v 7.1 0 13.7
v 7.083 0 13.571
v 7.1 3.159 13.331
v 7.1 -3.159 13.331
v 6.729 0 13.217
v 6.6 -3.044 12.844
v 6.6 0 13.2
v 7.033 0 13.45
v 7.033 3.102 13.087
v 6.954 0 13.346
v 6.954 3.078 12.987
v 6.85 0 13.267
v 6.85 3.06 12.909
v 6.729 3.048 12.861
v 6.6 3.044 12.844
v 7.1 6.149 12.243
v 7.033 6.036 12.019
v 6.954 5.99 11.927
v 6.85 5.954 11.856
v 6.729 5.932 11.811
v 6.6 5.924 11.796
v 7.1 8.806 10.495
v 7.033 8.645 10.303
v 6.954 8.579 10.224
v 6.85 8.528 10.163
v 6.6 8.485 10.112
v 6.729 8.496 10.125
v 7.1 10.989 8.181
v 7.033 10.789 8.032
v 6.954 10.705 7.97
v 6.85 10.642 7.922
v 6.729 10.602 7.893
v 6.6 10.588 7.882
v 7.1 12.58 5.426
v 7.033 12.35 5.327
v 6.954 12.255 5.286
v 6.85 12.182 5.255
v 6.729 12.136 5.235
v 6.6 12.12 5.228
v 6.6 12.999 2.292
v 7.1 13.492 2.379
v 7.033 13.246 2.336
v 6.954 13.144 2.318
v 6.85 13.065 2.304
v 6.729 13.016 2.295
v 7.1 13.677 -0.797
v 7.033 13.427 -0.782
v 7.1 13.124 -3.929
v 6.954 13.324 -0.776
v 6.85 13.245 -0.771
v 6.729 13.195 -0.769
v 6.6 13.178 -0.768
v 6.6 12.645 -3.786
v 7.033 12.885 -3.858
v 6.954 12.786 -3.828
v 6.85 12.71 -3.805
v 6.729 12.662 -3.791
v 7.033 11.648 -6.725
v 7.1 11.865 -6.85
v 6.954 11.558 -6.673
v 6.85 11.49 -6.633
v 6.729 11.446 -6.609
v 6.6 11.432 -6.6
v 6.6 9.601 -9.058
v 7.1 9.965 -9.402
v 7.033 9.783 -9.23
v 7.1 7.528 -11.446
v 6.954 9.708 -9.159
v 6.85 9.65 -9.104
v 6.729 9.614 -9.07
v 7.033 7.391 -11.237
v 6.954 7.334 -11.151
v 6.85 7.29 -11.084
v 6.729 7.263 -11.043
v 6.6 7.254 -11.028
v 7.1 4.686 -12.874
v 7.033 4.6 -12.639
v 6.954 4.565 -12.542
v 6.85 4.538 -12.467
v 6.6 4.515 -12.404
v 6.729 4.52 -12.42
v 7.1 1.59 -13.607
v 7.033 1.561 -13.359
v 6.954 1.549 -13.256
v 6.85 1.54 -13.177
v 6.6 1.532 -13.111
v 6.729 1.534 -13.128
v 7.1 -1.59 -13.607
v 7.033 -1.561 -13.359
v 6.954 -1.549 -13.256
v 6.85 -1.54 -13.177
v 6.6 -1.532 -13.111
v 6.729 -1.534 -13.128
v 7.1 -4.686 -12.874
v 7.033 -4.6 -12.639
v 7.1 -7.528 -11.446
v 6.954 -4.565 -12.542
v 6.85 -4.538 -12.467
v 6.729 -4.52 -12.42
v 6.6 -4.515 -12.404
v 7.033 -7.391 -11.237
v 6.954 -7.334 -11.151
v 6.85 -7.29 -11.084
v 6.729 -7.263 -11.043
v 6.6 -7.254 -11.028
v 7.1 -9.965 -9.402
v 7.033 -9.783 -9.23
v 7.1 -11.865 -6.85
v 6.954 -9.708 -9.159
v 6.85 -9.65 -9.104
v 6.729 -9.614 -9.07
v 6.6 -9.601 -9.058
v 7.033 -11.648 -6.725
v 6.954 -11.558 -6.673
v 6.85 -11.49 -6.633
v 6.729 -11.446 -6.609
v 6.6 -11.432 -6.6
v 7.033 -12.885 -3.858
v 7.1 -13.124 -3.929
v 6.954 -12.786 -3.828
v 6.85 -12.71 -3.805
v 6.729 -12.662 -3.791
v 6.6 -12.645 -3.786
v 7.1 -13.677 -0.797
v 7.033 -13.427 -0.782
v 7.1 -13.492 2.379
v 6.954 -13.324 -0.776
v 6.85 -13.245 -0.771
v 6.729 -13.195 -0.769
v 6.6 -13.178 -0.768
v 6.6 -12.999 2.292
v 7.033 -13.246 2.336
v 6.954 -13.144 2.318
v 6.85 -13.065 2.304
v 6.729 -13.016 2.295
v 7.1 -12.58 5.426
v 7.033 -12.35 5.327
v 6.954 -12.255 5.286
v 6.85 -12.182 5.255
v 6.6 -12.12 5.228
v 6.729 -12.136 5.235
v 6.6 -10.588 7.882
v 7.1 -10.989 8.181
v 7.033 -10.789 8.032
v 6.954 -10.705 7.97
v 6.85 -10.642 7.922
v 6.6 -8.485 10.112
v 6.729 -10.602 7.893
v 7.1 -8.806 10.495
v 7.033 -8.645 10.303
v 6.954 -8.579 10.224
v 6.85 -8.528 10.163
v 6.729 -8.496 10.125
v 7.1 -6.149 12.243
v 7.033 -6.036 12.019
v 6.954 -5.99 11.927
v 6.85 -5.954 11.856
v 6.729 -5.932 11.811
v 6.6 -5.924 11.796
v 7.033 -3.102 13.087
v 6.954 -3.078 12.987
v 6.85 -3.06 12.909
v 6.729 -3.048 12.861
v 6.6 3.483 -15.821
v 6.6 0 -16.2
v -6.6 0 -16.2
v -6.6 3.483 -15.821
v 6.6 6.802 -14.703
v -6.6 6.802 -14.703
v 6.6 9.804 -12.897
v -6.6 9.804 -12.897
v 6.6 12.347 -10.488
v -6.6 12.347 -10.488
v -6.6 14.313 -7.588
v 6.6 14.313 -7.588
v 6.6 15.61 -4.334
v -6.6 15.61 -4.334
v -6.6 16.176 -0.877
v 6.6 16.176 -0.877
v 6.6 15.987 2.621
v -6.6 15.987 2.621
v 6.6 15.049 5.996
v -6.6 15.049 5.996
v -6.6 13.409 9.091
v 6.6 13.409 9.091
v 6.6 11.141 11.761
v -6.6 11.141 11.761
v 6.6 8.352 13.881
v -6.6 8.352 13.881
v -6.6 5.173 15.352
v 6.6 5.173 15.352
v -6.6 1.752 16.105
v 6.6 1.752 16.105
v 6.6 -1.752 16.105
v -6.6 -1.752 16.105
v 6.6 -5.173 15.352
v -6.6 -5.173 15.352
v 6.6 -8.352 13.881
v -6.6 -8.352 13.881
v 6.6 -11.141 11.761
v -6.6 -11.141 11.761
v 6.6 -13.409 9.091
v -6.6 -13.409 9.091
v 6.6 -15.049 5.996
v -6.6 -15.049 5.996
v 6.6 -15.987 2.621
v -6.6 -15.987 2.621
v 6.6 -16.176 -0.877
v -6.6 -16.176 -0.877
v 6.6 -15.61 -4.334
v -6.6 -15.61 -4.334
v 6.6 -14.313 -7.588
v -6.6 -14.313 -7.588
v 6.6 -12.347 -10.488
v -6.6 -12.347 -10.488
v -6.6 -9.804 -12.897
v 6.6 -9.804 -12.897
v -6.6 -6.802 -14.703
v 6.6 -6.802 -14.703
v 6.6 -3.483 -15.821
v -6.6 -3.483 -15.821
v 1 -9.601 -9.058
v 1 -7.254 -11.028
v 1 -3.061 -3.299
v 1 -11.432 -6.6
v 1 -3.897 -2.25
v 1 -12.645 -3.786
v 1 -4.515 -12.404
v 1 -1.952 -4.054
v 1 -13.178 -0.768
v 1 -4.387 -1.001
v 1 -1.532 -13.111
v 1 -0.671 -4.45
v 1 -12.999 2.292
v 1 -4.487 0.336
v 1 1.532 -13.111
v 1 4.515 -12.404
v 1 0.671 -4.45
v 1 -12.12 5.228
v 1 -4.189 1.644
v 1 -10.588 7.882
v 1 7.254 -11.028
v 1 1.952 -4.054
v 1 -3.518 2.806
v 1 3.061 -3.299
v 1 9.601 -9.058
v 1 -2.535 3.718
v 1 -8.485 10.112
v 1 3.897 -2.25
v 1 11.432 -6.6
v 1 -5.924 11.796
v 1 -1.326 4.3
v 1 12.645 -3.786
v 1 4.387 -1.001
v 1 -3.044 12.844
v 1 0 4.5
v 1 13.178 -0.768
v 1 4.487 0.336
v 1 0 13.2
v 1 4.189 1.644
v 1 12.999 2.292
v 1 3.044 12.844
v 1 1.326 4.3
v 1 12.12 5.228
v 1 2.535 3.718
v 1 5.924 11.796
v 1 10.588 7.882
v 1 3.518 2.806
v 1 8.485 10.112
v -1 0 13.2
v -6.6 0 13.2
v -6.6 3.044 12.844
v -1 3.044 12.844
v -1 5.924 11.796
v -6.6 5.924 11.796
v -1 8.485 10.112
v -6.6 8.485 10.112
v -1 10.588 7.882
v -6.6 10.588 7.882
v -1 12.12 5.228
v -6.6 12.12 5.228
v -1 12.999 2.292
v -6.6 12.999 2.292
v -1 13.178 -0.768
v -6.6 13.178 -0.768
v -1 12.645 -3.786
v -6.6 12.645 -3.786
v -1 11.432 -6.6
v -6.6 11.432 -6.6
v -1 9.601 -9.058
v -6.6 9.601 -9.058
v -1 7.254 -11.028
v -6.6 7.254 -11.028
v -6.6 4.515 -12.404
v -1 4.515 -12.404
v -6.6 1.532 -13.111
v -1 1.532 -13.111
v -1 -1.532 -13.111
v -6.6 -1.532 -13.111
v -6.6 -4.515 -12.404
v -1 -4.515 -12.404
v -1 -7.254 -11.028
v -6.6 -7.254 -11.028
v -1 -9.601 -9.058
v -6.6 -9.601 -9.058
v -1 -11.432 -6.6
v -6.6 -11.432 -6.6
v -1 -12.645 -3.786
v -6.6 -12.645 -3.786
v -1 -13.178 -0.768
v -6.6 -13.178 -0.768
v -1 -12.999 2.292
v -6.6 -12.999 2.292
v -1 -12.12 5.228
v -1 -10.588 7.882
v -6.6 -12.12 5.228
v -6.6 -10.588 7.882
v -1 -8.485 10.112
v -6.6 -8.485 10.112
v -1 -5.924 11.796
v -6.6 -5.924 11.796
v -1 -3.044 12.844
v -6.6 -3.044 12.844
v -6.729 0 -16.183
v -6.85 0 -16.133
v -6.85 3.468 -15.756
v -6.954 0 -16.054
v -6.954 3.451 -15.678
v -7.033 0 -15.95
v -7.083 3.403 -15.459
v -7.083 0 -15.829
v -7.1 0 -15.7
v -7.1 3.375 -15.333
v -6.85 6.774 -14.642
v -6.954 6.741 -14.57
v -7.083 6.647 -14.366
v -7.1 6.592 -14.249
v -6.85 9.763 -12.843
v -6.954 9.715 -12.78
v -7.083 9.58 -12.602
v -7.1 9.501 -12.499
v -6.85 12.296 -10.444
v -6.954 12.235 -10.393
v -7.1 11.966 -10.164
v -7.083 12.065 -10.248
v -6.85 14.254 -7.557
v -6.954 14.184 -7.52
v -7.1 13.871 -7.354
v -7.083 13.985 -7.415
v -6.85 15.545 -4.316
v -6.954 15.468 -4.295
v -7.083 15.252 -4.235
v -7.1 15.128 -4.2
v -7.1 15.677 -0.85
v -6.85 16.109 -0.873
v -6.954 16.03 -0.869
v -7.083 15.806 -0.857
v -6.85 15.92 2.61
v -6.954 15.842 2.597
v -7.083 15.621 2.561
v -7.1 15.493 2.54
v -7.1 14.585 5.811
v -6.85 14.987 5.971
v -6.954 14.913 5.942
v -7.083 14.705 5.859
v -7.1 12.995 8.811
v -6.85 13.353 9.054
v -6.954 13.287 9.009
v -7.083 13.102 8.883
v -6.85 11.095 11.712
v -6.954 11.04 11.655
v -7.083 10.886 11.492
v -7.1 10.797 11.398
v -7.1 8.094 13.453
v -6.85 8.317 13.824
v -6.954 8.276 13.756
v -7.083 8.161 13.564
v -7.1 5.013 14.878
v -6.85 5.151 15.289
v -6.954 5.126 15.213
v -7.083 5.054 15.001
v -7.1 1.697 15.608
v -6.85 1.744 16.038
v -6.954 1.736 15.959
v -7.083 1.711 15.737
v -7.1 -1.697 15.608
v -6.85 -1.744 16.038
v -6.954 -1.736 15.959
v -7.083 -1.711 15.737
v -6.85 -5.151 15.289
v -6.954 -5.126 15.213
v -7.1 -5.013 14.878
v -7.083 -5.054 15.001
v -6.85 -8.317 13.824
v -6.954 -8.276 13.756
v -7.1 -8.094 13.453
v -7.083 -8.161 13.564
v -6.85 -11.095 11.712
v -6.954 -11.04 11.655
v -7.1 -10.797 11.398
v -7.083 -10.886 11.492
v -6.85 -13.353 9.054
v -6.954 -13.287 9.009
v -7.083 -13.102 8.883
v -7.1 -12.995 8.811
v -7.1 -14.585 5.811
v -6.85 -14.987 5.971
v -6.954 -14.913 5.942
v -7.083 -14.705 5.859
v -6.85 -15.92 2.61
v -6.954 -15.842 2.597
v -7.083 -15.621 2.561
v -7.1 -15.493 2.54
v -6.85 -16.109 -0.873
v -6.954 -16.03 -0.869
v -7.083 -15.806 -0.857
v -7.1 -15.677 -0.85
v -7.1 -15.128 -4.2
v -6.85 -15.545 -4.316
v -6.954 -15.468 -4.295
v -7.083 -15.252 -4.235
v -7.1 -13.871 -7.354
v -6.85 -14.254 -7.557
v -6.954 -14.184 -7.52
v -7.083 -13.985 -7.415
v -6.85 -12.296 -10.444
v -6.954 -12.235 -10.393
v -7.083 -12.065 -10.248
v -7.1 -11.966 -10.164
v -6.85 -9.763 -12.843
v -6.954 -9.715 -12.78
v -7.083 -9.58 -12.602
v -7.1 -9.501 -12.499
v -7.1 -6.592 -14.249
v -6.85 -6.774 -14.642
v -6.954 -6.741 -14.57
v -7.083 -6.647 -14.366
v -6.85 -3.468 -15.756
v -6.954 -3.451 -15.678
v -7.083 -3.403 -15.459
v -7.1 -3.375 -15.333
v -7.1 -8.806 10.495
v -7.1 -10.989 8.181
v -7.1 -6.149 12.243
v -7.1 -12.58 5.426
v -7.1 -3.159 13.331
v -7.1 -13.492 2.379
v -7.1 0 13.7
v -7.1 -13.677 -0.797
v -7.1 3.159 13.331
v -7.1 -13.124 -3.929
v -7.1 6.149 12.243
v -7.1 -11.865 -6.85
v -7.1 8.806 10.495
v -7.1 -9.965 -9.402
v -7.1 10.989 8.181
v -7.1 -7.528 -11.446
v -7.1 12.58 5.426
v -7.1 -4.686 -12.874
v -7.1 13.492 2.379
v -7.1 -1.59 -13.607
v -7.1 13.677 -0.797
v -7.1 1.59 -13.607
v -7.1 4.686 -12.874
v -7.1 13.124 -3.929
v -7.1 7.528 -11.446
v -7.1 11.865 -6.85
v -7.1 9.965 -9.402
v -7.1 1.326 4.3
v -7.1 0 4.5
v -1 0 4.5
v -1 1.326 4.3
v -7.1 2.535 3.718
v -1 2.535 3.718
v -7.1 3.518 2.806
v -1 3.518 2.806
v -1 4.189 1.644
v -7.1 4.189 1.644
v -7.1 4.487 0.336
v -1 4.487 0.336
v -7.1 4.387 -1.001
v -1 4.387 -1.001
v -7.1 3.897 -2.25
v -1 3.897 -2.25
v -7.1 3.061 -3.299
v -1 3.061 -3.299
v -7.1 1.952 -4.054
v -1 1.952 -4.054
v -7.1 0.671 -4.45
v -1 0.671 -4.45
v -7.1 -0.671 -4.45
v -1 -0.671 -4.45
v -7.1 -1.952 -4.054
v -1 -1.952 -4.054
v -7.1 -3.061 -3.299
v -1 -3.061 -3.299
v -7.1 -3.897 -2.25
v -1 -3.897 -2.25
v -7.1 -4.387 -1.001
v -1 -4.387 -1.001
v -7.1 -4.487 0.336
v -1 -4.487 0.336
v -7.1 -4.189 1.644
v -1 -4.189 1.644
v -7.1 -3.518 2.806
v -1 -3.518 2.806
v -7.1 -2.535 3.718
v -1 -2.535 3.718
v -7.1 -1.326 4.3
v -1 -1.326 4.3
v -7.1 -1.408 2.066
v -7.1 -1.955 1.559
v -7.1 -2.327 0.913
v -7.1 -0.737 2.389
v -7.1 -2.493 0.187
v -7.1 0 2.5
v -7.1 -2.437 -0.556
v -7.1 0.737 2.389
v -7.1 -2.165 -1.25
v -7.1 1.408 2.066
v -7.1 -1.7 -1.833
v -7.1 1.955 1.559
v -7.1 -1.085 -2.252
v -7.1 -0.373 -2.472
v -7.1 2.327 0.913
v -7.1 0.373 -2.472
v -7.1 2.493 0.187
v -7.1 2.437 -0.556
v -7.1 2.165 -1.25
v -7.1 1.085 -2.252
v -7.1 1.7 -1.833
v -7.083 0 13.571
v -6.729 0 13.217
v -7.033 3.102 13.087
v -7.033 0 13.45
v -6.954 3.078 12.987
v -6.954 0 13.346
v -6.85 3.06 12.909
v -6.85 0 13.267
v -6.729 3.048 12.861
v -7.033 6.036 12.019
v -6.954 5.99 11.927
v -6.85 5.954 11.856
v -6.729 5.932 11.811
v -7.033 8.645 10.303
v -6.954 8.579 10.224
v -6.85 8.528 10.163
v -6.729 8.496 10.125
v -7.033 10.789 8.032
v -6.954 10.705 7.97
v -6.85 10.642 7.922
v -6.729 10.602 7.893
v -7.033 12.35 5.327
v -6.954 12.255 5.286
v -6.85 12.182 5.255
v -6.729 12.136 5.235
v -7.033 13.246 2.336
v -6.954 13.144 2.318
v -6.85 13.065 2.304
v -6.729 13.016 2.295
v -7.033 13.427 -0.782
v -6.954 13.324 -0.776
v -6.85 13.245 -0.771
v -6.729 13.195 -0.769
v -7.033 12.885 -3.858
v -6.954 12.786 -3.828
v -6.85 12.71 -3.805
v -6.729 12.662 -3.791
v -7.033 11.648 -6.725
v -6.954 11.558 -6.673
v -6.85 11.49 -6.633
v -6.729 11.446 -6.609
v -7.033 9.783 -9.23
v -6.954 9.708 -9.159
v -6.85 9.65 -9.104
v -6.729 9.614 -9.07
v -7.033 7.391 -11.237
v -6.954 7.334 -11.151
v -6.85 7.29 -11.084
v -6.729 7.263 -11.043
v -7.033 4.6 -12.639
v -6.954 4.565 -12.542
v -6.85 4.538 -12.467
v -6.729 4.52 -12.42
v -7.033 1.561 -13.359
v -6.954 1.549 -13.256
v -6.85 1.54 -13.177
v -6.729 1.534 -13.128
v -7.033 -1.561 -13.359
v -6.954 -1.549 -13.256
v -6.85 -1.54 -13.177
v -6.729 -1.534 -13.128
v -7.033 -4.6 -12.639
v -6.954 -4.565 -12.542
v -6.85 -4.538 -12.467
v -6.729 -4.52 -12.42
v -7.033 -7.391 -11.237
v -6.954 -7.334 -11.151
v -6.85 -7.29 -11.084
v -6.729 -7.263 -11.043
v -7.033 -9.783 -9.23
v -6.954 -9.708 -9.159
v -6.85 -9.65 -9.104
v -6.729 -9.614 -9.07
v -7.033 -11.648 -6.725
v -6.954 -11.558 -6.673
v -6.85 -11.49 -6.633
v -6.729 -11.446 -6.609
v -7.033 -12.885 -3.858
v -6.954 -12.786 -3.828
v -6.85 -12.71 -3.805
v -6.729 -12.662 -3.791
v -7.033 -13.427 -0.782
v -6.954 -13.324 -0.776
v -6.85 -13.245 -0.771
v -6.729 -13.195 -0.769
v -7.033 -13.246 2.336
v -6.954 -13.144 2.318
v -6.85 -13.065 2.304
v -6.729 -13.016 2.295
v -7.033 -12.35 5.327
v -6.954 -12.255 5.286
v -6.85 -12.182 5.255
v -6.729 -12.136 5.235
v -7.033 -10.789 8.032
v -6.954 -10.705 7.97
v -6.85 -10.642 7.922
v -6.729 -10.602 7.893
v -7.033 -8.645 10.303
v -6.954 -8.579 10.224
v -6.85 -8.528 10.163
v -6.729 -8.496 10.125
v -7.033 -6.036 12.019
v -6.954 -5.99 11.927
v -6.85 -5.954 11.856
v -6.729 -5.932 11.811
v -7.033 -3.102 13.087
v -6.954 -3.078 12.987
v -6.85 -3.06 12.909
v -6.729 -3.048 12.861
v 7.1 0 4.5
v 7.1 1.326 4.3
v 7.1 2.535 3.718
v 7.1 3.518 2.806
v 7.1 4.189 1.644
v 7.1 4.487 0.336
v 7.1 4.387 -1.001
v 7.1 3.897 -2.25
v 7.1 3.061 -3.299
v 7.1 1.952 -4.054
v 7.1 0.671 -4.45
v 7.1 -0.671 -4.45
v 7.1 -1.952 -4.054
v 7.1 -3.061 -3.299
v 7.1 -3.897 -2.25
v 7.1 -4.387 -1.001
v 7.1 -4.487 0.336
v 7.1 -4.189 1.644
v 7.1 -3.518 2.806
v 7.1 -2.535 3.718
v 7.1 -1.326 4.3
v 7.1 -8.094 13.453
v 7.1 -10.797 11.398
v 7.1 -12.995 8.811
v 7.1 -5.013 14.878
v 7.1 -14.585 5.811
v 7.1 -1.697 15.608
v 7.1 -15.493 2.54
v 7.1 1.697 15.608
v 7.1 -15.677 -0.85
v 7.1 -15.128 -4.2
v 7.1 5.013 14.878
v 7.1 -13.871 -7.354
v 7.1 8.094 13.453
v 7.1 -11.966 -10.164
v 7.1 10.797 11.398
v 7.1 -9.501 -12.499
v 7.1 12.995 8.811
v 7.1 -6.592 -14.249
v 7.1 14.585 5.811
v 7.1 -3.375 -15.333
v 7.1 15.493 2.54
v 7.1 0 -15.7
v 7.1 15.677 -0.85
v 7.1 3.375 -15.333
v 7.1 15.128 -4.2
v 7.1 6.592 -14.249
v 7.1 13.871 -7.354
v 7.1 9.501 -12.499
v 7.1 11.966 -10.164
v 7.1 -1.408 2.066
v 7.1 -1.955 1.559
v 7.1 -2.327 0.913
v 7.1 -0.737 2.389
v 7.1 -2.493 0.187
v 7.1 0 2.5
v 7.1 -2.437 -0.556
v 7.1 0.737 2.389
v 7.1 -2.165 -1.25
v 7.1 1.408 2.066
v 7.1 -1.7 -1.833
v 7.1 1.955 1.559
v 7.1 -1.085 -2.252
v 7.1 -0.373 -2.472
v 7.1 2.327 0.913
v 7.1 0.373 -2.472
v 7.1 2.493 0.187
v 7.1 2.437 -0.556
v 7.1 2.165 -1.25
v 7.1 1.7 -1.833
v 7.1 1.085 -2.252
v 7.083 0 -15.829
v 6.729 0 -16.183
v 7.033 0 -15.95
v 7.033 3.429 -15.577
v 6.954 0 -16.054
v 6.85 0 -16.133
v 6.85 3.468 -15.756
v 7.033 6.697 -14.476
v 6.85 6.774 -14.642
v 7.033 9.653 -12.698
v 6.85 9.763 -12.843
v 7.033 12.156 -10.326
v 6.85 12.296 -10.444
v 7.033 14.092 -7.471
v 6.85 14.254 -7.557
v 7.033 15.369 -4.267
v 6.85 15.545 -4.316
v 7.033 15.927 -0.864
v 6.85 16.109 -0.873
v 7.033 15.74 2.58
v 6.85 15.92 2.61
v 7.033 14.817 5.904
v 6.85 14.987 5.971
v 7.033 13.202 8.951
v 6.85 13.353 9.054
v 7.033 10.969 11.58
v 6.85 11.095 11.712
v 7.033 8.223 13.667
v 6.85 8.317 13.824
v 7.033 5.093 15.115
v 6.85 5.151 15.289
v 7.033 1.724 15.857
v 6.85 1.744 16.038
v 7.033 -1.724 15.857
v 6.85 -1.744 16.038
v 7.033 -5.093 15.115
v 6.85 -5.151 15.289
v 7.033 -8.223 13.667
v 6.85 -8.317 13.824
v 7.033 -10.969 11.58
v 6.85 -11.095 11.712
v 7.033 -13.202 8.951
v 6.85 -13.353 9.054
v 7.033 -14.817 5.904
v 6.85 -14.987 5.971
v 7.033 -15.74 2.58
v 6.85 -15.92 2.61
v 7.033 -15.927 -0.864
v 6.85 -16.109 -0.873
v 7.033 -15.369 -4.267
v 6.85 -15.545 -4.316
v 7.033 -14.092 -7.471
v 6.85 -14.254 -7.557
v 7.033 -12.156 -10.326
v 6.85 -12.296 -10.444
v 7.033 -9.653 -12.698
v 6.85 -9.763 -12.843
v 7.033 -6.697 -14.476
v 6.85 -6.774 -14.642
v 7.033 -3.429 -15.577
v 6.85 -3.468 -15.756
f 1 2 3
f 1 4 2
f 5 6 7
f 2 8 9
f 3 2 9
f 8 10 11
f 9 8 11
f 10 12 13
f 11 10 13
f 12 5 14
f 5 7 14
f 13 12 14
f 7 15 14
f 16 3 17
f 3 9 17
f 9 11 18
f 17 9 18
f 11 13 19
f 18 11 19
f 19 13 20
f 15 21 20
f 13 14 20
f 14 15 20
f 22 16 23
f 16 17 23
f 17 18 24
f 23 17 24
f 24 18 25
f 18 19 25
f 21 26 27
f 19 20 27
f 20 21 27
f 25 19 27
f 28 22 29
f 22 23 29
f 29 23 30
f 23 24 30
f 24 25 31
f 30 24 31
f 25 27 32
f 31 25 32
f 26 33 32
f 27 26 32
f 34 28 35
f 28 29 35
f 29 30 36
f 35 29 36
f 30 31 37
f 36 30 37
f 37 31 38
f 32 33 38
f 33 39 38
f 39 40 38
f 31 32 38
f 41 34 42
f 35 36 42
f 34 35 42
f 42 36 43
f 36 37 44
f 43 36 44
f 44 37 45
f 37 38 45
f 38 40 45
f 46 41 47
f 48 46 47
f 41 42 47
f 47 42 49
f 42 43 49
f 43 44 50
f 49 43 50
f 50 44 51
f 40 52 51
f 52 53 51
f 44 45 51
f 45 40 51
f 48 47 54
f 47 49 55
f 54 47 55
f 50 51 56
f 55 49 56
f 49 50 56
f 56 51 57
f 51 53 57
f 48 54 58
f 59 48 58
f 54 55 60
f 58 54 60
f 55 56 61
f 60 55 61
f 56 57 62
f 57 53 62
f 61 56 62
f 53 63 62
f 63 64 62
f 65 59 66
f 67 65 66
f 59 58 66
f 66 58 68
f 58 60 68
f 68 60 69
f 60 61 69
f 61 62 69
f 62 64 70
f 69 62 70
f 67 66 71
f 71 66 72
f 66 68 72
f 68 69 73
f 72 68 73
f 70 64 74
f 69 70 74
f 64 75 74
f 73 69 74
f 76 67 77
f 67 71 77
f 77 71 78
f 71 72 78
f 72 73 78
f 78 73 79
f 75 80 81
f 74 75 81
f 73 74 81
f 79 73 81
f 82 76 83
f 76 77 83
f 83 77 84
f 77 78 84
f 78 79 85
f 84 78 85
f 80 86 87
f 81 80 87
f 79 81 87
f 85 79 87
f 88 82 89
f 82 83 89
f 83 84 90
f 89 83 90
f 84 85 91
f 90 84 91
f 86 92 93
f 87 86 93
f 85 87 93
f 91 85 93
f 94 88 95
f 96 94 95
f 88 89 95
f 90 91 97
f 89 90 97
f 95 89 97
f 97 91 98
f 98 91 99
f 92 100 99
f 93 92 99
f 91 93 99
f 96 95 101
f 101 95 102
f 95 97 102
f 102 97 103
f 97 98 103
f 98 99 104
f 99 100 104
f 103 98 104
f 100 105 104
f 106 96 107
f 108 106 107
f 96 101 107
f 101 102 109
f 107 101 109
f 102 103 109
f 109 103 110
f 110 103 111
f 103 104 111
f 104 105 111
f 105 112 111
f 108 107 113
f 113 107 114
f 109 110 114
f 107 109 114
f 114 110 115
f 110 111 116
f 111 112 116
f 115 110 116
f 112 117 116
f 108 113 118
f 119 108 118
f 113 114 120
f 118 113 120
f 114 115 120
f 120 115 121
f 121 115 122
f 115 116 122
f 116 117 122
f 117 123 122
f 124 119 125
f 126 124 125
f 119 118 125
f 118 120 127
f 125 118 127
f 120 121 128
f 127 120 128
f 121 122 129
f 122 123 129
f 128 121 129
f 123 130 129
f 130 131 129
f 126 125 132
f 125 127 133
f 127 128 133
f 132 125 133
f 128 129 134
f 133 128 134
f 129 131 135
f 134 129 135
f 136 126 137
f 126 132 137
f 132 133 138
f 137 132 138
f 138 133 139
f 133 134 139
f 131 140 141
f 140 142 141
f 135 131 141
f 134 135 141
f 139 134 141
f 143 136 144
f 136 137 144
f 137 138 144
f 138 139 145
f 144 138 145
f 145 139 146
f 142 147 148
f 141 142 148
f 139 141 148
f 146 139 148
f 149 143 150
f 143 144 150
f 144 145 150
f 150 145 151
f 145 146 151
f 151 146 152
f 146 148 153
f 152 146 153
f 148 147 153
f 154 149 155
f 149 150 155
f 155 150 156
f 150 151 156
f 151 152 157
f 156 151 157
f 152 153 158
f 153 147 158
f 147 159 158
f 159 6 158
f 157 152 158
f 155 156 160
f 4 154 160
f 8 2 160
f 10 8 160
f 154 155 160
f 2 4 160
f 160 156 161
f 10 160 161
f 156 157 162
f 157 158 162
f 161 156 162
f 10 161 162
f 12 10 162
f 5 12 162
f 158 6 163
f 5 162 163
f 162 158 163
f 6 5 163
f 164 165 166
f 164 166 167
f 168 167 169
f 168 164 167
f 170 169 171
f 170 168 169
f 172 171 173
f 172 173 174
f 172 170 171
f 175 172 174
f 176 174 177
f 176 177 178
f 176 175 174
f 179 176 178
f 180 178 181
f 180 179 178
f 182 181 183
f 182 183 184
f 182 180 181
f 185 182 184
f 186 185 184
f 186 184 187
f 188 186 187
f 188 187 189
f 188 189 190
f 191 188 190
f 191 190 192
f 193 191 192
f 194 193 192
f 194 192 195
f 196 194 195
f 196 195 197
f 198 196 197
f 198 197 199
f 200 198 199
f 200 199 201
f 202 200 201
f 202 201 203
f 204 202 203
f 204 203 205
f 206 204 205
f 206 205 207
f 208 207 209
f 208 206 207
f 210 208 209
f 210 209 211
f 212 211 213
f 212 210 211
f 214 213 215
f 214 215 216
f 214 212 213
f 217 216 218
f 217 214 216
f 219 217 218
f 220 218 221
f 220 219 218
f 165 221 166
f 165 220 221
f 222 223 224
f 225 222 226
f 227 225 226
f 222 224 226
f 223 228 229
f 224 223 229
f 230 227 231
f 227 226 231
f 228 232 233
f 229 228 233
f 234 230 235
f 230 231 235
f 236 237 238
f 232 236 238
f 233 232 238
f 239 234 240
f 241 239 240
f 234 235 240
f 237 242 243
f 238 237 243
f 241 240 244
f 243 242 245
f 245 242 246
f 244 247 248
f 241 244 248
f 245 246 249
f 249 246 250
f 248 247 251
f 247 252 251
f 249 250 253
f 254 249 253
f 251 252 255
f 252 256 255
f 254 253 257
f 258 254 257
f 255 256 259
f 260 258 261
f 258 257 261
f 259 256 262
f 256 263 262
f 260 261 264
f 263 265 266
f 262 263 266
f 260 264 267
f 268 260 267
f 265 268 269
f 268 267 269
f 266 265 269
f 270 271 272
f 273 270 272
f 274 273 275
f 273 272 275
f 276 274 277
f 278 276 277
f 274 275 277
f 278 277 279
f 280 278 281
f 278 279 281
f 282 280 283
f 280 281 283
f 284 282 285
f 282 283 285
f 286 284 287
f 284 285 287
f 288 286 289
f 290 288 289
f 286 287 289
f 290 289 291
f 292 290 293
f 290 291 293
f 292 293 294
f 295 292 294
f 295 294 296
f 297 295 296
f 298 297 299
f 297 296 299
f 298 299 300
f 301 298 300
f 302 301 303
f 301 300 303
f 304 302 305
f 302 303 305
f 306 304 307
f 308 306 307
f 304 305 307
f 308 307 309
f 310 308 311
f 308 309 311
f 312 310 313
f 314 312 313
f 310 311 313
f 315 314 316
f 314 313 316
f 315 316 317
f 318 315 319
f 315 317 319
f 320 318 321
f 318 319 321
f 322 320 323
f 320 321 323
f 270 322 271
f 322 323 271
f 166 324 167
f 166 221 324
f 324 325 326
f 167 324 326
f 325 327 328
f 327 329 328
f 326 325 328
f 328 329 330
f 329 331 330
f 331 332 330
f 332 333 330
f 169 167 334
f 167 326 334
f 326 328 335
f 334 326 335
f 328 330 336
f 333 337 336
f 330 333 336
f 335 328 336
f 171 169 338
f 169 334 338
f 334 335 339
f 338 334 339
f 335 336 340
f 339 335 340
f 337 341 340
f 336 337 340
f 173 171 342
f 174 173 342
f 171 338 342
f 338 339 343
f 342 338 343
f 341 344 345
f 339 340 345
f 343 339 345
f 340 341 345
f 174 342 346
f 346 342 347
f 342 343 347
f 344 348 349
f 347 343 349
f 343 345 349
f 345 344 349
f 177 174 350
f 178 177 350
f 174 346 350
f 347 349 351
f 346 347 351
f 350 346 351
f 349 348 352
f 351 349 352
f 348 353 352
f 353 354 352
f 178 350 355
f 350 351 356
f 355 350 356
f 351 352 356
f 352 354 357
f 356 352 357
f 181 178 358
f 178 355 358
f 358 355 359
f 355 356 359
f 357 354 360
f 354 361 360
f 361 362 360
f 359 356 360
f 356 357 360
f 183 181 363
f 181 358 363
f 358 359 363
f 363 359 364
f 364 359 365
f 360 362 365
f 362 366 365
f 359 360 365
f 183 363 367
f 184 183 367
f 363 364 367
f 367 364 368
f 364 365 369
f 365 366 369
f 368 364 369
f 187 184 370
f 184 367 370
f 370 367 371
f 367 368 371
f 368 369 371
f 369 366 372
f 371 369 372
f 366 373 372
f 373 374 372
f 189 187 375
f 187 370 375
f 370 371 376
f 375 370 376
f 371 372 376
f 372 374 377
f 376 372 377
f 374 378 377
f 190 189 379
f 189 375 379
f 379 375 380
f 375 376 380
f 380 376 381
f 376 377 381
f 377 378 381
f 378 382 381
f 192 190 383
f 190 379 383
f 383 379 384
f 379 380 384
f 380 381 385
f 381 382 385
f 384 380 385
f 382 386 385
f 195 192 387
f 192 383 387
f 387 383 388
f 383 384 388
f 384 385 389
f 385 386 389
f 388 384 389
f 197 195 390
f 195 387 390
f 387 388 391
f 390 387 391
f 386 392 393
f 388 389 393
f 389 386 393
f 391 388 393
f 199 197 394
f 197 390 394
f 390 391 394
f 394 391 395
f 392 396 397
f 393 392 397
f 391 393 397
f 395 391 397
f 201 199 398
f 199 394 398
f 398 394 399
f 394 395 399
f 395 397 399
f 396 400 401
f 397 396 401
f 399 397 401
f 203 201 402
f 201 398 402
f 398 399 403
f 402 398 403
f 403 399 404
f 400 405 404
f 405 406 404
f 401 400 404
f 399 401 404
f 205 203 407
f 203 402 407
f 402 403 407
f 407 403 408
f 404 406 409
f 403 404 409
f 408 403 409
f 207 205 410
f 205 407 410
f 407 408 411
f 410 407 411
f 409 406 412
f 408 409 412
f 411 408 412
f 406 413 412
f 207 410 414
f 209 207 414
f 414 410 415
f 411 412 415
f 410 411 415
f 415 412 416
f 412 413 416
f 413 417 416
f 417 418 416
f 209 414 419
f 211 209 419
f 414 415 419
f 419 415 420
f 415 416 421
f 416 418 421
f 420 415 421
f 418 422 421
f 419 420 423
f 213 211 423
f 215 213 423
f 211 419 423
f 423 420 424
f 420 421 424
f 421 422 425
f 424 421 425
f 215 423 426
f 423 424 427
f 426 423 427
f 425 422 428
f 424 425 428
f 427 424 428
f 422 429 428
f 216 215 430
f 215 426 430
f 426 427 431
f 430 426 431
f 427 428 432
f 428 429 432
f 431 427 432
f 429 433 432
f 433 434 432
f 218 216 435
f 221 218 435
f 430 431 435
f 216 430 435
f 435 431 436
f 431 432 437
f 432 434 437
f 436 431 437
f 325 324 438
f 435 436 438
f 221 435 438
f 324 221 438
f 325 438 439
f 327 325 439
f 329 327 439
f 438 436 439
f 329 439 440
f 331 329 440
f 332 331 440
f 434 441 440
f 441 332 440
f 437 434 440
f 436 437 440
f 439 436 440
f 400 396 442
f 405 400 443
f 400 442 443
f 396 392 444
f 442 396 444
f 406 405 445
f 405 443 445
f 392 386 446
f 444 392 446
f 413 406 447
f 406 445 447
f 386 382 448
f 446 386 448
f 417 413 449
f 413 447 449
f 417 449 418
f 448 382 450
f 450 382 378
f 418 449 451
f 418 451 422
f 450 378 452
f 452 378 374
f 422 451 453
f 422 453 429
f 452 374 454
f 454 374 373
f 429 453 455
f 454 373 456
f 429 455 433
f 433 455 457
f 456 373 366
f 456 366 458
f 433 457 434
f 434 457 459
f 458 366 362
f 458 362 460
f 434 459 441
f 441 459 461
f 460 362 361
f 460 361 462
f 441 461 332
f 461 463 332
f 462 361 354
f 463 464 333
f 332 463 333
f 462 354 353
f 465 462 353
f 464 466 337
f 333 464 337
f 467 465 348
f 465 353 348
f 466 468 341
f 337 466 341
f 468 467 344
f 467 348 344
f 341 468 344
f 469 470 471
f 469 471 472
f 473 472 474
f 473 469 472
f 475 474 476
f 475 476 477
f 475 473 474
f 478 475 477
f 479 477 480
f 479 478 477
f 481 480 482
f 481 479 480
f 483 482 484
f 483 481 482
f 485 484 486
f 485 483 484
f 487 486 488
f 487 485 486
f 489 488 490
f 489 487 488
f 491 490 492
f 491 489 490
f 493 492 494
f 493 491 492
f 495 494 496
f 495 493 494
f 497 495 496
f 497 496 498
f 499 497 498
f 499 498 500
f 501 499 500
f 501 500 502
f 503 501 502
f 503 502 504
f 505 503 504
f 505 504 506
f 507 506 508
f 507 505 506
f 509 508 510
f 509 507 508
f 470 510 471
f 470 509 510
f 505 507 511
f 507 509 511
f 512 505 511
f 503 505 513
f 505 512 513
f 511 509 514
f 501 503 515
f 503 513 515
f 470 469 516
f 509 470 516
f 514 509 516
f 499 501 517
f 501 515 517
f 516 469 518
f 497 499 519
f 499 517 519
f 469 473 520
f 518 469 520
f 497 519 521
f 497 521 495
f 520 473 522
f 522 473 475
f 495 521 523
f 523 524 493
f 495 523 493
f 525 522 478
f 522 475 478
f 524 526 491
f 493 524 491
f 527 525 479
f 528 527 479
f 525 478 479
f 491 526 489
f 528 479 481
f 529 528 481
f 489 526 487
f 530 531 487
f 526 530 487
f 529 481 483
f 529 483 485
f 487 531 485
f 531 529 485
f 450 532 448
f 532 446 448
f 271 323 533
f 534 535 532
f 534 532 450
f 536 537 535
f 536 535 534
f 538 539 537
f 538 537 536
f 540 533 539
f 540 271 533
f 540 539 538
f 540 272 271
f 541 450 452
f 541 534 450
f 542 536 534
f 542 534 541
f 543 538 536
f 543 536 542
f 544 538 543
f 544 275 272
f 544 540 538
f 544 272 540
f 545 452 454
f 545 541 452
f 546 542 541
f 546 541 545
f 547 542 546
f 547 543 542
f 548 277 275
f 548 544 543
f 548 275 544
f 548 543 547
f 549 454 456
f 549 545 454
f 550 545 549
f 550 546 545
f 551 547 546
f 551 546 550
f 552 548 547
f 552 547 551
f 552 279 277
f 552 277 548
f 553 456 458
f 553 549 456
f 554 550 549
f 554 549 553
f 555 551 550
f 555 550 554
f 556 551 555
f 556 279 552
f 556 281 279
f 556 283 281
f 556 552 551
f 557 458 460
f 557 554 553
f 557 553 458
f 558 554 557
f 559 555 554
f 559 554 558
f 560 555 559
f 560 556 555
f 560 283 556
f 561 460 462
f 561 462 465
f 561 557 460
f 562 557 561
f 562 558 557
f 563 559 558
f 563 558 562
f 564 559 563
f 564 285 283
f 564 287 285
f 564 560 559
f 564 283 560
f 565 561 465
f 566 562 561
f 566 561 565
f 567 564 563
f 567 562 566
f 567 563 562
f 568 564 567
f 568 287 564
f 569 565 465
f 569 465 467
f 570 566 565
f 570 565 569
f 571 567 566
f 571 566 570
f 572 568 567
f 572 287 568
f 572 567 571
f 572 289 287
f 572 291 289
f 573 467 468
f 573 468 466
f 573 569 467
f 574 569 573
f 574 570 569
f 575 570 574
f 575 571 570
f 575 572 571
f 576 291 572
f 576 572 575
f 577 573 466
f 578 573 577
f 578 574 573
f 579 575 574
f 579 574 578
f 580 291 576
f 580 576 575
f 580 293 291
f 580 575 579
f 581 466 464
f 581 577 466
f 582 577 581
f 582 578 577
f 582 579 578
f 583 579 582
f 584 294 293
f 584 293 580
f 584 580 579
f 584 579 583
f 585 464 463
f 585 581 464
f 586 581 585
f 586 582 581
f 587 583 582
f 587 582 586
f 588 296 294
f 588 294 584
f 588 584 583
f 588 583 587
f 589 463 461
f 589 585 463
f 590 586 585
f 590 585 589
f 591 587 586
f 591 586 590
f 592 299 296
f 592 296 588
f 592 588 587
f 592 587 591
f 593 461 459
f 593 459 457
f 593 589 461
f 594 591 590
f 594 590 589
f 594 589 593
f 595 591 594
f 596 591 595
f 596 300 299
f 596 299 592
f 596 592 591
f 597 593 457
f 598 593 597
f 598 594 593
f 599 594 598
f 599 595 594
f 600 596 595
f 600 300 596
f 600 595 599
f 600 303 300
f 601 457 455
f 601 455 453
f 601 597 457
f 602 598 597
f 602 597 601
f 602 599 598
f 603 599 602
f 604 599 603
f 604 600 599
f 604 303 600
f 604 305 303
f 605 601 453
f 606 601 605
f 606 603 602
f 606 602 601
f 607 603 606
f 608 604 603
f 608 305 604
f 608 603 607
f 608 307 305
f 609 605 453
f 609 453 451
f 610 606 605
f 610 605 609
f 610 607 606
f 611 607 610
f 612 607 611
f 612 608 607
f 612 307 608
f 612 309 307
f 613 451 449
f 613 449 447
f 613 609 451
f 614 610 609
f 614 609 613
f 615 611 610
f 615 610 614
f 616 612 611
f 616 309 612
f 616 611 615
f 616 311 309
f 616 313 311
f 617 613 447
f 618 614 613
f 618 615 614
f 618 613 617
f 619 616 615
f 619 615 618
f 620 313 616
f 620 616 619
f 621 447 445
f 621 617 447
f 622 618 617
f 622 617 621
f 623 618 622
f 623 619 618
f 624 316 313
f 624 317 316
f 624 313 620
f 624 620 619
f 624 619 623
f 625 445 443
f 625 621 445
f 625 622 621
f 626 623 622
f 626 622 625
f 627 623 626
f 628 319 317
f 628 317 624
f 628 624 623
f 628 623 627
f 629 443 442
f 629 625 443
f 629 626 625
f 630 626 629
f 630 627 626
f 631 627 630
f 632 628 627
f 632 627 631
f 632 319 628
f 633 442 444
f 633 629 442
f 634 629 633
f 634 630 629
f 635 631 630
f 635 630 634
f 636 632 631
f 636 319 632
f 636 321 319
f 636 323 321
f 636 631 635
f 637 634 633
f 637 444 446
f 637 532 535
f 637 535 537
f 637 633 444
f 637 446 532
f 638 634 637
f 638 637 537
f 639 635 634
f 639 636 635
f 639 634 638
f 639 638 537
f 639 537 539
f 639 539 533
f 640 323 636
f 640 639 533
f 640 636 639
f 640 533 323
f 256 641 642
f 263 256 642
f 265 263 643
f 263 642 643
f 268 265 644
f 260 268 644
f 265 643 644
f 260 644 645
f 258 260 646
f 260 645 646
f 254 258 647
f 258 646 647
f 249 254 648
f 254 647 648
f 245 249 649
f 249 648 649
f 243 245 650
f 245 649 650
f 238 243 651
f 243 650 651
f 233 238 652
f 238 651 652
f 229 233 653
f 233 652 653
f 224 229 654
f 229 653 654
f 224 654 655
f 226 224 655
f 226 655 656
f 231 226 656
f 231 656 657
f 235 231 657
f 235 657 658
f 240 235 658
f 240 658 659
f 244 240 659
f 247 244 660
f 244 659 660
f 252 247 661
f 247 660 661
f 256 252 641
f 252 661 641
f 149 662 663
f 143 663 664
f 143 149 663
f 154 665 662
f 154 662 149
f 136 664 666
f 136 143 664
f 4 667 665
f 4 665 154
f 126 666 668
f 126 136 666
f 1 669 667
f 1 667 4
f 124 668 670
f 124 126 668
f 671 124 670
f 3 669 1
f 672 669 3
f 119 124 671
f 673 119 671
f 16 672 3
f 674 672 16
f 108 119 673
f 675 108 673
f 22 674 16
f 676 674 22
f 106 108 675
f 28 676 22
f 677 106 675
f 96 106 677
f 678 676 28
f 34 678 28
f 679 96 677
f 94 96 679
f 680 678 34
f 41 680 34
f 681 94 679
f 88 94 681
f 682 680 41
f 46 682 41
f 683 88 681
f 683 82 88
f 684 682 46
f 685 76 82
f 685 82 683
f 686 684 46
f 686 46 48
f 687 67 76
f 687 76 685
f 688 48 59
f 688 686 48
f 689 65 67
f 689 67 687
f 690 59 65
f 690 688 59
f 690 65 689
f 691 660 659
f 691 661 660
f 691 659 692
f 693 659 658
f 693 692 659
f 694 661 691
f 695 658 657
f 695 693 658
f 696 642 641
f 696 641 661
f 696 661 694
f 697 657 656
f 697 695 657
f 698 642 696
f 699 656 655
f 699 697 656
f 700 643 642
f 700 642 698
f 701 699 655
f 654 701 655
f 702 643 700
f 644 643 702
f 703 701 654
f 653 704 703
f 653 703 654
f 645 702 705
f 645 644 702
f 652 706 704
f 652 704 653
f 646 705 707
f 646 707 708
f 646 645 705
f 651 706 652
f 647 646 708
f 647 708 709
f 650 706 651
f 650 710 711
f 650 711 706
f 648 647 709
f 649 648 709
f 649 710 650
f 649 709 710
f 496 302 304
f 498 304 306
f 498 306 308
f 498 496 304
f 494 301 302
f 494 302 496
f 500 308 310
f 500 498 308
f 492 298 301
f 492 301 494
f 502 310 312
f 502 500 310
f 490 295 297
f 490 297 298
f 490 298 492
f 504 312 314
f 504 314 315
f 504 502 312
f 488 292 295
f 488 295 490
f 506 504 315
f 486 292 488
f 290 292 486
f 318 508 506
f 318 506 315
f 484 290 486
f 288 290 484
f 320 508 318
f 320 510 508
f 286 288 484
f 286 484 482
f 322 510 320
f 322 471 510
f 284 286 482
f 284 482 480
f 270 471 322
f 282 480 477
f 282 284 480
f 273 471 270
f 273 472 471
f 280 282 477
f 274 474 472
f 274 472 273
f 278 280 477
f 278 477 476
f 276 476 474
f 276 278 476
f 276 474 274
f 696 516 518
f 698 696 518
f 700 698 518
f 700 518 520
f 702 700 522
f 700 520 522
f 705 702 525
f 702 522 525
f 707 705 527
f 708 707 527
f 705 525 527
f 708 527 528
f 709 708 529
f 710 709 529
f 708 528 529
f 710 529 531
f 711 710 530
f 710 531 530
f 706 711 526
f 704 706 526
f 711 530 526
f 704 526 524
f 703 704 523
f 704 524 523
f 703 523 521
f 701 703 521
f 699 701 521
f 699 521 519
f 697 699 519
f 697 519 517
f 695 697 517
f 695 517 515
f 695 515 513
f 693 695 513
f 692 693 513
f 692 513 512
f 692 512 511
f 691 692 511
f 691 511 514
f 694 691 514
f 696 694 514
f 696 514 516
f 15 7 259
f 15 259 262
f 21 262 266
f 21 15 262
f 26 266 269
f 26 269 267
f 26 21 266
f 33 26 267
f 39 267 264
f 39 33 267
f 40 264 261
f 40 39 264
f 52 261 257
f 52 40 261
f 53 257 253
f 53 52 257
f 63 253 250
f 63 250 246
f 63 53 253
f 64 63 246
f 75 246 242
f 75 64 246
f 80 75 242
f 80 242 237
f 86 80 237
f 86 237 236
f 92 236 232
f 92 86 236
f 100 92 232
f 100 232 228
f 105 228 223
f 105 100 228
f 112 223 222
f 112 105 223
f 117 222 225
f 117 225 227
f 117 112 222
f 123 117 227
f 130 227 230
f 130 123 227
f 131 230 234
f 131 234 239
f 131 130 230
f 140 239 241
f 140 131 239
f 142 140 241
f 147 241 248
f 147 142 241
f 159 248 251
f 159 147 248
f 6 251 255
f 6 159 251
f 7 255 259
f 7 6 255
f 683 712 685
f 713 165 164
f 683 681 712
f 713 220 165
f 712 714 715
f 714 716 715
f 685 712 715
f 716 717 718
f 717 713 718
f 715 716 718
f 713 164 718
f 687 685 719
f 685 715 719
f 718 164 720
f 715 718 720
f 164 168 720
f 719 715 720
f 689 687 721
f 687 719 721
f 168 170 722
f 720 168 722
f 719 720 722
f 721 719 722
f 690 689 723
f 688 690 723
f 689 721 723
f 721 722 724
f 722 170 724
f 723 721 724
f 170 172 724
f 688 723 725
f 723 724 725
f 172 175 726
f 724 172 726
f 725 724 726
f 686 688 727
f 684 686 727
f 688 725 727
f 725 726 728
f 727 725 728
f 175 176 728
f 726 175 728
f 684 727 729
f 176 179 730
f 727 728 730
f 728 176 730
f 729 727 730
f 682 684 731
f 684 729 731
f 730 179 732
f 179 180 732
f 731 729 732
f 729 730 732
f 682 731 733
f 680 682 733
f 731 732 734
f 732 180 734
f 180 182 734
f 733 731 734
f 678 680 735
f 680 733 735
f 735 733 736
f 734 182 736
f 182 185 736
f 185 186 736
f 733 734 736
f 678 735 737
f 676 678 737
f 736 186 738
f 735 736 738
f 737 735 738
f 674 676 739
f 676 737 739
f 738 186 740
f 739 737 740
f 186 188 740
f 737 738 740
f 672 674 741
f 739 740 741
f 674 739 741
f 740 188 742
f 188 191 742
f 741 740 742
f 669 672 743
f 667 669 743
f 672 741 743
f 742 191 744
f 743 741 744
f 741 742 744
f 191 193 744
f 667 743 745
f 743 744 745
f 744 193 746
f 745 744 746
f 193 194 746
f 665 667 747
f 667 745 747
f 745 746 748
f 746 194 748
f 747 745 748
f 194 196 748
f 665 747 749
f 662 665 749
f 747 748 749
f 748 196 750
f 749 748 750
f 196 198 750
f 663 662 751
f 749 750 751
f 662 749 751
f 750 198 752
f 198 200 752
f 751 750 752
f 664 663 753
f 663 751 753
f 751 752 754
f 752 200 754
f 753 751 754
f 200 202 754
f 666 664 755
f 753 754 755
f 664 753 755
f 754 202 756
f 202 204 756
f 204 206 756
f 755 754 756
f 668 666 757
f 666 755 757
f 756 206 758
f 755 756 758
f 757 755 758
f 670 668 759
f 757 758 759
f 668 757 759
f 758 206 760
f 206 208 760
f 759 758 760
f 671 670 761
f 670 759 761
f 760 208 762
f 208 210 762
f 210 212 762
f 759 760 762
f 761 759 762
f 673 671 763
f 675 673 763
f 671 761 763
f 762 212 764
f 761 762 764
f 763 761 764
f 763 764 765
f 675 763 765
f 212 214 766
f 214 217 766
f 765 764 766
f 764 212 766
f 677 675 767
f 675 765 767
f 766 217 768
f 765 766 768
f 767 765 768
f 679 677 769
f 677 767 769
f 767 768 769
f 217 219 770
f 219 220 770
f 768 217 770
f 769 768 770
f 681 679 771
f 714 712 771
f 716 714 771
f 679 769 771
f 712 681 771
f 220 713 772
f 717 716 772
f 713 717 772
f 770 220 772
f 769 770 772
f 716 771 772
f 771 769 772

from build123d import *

# Parameters (mm, degrees)
SKETCH1_R           = 16.2
BOSS_EXTRUDE1_DEPTH = 7.1
SKETCH6_R           = 13.2
SKETCH6_R_2         = 4.5
CUT_EXTRUDE2_DEPTH  = 6.1
FILLET2_R           = 0.5
FILLET3_R           = 0.5
FILLET4_R           = 0.5
FILLET5_R           = 0.5
SKETCH7_R           = 2.5
CUT_EXTRUDE3_DEPTH  = 27.954035009


with BuildPart() as part:
    # Sketch1 → Boss-Extrude1 (new, symmetric)
    with BuildSketch(Plane(origin=(0, 0, 0), x_dir=(0, 0, -1), z_dir=(1, 0, 0))):
        Circle(SKETCH1_R)
    extrude(amount=BOSS_EXTRUDE1_DEPTH, both=True)

    # Sketch6 → Cut-Extrude2 (cut)
    with BuildSketch(Plane.ZY.offset(7.1)):
        Circle(SKETCH6_R)
        Circle(SKETCH6_R_2, mode=Mode.SUBTRACT)
    cut_extrude2 = extrude(amount=-CUT_EXTRUDE2_DEPTH, mode=Mode.SUBTRACT)

    # Mirror1: Cut-Extrude2 across plane
    add(cut_extrude2.mirror(Plane(origin=(0, 0, 0), x_dir=(0, 0, 1), z_dir=(1, 0, 0))), mode=Mode.SUBTRACT)

    # Fillet2
    fillet2_edges = [part.edges().sort_by_distance(p)[0] for p in [
        (-7.1, 0, 16.2),
    ]]
    fillet(fillet2_edges, radius=FILLET2_R)

    # Fillet3
    fillet3_edges = [part.edges().sort_by_distance(p)[0] for p in [
        (-7.1, 0, -13.2),
    ]]
    fillet(fillet3_edges, radius=FILLET3_R)

    # Fillet4
    fillet4_edges = [part.edges().sort_by_distance(p)[0] for p in [
        (7.1, 0, -13.2),
    ]]
    fillet(fillet4_edges, radius=FILLET4_R)

    # Fillet5
    fillet5_edges = [part.edges().sort_by_distance(p)[0] for p in [
        (7.1, 0, 16.2),
    ]]
    fillet(fillet5_edges, radius=FILLET5_R)

    # Sketch7 → Cut-Extrude3 (cut, through all)
    with BuildSketch(Plane.ZY.offset(7.1)):
        Circle(SKETCH7_R)
    extrude(amount=-CUT_EXTRUDE3_DEPTH, mode=Mode.SUBTRACT)


solid = part.part
